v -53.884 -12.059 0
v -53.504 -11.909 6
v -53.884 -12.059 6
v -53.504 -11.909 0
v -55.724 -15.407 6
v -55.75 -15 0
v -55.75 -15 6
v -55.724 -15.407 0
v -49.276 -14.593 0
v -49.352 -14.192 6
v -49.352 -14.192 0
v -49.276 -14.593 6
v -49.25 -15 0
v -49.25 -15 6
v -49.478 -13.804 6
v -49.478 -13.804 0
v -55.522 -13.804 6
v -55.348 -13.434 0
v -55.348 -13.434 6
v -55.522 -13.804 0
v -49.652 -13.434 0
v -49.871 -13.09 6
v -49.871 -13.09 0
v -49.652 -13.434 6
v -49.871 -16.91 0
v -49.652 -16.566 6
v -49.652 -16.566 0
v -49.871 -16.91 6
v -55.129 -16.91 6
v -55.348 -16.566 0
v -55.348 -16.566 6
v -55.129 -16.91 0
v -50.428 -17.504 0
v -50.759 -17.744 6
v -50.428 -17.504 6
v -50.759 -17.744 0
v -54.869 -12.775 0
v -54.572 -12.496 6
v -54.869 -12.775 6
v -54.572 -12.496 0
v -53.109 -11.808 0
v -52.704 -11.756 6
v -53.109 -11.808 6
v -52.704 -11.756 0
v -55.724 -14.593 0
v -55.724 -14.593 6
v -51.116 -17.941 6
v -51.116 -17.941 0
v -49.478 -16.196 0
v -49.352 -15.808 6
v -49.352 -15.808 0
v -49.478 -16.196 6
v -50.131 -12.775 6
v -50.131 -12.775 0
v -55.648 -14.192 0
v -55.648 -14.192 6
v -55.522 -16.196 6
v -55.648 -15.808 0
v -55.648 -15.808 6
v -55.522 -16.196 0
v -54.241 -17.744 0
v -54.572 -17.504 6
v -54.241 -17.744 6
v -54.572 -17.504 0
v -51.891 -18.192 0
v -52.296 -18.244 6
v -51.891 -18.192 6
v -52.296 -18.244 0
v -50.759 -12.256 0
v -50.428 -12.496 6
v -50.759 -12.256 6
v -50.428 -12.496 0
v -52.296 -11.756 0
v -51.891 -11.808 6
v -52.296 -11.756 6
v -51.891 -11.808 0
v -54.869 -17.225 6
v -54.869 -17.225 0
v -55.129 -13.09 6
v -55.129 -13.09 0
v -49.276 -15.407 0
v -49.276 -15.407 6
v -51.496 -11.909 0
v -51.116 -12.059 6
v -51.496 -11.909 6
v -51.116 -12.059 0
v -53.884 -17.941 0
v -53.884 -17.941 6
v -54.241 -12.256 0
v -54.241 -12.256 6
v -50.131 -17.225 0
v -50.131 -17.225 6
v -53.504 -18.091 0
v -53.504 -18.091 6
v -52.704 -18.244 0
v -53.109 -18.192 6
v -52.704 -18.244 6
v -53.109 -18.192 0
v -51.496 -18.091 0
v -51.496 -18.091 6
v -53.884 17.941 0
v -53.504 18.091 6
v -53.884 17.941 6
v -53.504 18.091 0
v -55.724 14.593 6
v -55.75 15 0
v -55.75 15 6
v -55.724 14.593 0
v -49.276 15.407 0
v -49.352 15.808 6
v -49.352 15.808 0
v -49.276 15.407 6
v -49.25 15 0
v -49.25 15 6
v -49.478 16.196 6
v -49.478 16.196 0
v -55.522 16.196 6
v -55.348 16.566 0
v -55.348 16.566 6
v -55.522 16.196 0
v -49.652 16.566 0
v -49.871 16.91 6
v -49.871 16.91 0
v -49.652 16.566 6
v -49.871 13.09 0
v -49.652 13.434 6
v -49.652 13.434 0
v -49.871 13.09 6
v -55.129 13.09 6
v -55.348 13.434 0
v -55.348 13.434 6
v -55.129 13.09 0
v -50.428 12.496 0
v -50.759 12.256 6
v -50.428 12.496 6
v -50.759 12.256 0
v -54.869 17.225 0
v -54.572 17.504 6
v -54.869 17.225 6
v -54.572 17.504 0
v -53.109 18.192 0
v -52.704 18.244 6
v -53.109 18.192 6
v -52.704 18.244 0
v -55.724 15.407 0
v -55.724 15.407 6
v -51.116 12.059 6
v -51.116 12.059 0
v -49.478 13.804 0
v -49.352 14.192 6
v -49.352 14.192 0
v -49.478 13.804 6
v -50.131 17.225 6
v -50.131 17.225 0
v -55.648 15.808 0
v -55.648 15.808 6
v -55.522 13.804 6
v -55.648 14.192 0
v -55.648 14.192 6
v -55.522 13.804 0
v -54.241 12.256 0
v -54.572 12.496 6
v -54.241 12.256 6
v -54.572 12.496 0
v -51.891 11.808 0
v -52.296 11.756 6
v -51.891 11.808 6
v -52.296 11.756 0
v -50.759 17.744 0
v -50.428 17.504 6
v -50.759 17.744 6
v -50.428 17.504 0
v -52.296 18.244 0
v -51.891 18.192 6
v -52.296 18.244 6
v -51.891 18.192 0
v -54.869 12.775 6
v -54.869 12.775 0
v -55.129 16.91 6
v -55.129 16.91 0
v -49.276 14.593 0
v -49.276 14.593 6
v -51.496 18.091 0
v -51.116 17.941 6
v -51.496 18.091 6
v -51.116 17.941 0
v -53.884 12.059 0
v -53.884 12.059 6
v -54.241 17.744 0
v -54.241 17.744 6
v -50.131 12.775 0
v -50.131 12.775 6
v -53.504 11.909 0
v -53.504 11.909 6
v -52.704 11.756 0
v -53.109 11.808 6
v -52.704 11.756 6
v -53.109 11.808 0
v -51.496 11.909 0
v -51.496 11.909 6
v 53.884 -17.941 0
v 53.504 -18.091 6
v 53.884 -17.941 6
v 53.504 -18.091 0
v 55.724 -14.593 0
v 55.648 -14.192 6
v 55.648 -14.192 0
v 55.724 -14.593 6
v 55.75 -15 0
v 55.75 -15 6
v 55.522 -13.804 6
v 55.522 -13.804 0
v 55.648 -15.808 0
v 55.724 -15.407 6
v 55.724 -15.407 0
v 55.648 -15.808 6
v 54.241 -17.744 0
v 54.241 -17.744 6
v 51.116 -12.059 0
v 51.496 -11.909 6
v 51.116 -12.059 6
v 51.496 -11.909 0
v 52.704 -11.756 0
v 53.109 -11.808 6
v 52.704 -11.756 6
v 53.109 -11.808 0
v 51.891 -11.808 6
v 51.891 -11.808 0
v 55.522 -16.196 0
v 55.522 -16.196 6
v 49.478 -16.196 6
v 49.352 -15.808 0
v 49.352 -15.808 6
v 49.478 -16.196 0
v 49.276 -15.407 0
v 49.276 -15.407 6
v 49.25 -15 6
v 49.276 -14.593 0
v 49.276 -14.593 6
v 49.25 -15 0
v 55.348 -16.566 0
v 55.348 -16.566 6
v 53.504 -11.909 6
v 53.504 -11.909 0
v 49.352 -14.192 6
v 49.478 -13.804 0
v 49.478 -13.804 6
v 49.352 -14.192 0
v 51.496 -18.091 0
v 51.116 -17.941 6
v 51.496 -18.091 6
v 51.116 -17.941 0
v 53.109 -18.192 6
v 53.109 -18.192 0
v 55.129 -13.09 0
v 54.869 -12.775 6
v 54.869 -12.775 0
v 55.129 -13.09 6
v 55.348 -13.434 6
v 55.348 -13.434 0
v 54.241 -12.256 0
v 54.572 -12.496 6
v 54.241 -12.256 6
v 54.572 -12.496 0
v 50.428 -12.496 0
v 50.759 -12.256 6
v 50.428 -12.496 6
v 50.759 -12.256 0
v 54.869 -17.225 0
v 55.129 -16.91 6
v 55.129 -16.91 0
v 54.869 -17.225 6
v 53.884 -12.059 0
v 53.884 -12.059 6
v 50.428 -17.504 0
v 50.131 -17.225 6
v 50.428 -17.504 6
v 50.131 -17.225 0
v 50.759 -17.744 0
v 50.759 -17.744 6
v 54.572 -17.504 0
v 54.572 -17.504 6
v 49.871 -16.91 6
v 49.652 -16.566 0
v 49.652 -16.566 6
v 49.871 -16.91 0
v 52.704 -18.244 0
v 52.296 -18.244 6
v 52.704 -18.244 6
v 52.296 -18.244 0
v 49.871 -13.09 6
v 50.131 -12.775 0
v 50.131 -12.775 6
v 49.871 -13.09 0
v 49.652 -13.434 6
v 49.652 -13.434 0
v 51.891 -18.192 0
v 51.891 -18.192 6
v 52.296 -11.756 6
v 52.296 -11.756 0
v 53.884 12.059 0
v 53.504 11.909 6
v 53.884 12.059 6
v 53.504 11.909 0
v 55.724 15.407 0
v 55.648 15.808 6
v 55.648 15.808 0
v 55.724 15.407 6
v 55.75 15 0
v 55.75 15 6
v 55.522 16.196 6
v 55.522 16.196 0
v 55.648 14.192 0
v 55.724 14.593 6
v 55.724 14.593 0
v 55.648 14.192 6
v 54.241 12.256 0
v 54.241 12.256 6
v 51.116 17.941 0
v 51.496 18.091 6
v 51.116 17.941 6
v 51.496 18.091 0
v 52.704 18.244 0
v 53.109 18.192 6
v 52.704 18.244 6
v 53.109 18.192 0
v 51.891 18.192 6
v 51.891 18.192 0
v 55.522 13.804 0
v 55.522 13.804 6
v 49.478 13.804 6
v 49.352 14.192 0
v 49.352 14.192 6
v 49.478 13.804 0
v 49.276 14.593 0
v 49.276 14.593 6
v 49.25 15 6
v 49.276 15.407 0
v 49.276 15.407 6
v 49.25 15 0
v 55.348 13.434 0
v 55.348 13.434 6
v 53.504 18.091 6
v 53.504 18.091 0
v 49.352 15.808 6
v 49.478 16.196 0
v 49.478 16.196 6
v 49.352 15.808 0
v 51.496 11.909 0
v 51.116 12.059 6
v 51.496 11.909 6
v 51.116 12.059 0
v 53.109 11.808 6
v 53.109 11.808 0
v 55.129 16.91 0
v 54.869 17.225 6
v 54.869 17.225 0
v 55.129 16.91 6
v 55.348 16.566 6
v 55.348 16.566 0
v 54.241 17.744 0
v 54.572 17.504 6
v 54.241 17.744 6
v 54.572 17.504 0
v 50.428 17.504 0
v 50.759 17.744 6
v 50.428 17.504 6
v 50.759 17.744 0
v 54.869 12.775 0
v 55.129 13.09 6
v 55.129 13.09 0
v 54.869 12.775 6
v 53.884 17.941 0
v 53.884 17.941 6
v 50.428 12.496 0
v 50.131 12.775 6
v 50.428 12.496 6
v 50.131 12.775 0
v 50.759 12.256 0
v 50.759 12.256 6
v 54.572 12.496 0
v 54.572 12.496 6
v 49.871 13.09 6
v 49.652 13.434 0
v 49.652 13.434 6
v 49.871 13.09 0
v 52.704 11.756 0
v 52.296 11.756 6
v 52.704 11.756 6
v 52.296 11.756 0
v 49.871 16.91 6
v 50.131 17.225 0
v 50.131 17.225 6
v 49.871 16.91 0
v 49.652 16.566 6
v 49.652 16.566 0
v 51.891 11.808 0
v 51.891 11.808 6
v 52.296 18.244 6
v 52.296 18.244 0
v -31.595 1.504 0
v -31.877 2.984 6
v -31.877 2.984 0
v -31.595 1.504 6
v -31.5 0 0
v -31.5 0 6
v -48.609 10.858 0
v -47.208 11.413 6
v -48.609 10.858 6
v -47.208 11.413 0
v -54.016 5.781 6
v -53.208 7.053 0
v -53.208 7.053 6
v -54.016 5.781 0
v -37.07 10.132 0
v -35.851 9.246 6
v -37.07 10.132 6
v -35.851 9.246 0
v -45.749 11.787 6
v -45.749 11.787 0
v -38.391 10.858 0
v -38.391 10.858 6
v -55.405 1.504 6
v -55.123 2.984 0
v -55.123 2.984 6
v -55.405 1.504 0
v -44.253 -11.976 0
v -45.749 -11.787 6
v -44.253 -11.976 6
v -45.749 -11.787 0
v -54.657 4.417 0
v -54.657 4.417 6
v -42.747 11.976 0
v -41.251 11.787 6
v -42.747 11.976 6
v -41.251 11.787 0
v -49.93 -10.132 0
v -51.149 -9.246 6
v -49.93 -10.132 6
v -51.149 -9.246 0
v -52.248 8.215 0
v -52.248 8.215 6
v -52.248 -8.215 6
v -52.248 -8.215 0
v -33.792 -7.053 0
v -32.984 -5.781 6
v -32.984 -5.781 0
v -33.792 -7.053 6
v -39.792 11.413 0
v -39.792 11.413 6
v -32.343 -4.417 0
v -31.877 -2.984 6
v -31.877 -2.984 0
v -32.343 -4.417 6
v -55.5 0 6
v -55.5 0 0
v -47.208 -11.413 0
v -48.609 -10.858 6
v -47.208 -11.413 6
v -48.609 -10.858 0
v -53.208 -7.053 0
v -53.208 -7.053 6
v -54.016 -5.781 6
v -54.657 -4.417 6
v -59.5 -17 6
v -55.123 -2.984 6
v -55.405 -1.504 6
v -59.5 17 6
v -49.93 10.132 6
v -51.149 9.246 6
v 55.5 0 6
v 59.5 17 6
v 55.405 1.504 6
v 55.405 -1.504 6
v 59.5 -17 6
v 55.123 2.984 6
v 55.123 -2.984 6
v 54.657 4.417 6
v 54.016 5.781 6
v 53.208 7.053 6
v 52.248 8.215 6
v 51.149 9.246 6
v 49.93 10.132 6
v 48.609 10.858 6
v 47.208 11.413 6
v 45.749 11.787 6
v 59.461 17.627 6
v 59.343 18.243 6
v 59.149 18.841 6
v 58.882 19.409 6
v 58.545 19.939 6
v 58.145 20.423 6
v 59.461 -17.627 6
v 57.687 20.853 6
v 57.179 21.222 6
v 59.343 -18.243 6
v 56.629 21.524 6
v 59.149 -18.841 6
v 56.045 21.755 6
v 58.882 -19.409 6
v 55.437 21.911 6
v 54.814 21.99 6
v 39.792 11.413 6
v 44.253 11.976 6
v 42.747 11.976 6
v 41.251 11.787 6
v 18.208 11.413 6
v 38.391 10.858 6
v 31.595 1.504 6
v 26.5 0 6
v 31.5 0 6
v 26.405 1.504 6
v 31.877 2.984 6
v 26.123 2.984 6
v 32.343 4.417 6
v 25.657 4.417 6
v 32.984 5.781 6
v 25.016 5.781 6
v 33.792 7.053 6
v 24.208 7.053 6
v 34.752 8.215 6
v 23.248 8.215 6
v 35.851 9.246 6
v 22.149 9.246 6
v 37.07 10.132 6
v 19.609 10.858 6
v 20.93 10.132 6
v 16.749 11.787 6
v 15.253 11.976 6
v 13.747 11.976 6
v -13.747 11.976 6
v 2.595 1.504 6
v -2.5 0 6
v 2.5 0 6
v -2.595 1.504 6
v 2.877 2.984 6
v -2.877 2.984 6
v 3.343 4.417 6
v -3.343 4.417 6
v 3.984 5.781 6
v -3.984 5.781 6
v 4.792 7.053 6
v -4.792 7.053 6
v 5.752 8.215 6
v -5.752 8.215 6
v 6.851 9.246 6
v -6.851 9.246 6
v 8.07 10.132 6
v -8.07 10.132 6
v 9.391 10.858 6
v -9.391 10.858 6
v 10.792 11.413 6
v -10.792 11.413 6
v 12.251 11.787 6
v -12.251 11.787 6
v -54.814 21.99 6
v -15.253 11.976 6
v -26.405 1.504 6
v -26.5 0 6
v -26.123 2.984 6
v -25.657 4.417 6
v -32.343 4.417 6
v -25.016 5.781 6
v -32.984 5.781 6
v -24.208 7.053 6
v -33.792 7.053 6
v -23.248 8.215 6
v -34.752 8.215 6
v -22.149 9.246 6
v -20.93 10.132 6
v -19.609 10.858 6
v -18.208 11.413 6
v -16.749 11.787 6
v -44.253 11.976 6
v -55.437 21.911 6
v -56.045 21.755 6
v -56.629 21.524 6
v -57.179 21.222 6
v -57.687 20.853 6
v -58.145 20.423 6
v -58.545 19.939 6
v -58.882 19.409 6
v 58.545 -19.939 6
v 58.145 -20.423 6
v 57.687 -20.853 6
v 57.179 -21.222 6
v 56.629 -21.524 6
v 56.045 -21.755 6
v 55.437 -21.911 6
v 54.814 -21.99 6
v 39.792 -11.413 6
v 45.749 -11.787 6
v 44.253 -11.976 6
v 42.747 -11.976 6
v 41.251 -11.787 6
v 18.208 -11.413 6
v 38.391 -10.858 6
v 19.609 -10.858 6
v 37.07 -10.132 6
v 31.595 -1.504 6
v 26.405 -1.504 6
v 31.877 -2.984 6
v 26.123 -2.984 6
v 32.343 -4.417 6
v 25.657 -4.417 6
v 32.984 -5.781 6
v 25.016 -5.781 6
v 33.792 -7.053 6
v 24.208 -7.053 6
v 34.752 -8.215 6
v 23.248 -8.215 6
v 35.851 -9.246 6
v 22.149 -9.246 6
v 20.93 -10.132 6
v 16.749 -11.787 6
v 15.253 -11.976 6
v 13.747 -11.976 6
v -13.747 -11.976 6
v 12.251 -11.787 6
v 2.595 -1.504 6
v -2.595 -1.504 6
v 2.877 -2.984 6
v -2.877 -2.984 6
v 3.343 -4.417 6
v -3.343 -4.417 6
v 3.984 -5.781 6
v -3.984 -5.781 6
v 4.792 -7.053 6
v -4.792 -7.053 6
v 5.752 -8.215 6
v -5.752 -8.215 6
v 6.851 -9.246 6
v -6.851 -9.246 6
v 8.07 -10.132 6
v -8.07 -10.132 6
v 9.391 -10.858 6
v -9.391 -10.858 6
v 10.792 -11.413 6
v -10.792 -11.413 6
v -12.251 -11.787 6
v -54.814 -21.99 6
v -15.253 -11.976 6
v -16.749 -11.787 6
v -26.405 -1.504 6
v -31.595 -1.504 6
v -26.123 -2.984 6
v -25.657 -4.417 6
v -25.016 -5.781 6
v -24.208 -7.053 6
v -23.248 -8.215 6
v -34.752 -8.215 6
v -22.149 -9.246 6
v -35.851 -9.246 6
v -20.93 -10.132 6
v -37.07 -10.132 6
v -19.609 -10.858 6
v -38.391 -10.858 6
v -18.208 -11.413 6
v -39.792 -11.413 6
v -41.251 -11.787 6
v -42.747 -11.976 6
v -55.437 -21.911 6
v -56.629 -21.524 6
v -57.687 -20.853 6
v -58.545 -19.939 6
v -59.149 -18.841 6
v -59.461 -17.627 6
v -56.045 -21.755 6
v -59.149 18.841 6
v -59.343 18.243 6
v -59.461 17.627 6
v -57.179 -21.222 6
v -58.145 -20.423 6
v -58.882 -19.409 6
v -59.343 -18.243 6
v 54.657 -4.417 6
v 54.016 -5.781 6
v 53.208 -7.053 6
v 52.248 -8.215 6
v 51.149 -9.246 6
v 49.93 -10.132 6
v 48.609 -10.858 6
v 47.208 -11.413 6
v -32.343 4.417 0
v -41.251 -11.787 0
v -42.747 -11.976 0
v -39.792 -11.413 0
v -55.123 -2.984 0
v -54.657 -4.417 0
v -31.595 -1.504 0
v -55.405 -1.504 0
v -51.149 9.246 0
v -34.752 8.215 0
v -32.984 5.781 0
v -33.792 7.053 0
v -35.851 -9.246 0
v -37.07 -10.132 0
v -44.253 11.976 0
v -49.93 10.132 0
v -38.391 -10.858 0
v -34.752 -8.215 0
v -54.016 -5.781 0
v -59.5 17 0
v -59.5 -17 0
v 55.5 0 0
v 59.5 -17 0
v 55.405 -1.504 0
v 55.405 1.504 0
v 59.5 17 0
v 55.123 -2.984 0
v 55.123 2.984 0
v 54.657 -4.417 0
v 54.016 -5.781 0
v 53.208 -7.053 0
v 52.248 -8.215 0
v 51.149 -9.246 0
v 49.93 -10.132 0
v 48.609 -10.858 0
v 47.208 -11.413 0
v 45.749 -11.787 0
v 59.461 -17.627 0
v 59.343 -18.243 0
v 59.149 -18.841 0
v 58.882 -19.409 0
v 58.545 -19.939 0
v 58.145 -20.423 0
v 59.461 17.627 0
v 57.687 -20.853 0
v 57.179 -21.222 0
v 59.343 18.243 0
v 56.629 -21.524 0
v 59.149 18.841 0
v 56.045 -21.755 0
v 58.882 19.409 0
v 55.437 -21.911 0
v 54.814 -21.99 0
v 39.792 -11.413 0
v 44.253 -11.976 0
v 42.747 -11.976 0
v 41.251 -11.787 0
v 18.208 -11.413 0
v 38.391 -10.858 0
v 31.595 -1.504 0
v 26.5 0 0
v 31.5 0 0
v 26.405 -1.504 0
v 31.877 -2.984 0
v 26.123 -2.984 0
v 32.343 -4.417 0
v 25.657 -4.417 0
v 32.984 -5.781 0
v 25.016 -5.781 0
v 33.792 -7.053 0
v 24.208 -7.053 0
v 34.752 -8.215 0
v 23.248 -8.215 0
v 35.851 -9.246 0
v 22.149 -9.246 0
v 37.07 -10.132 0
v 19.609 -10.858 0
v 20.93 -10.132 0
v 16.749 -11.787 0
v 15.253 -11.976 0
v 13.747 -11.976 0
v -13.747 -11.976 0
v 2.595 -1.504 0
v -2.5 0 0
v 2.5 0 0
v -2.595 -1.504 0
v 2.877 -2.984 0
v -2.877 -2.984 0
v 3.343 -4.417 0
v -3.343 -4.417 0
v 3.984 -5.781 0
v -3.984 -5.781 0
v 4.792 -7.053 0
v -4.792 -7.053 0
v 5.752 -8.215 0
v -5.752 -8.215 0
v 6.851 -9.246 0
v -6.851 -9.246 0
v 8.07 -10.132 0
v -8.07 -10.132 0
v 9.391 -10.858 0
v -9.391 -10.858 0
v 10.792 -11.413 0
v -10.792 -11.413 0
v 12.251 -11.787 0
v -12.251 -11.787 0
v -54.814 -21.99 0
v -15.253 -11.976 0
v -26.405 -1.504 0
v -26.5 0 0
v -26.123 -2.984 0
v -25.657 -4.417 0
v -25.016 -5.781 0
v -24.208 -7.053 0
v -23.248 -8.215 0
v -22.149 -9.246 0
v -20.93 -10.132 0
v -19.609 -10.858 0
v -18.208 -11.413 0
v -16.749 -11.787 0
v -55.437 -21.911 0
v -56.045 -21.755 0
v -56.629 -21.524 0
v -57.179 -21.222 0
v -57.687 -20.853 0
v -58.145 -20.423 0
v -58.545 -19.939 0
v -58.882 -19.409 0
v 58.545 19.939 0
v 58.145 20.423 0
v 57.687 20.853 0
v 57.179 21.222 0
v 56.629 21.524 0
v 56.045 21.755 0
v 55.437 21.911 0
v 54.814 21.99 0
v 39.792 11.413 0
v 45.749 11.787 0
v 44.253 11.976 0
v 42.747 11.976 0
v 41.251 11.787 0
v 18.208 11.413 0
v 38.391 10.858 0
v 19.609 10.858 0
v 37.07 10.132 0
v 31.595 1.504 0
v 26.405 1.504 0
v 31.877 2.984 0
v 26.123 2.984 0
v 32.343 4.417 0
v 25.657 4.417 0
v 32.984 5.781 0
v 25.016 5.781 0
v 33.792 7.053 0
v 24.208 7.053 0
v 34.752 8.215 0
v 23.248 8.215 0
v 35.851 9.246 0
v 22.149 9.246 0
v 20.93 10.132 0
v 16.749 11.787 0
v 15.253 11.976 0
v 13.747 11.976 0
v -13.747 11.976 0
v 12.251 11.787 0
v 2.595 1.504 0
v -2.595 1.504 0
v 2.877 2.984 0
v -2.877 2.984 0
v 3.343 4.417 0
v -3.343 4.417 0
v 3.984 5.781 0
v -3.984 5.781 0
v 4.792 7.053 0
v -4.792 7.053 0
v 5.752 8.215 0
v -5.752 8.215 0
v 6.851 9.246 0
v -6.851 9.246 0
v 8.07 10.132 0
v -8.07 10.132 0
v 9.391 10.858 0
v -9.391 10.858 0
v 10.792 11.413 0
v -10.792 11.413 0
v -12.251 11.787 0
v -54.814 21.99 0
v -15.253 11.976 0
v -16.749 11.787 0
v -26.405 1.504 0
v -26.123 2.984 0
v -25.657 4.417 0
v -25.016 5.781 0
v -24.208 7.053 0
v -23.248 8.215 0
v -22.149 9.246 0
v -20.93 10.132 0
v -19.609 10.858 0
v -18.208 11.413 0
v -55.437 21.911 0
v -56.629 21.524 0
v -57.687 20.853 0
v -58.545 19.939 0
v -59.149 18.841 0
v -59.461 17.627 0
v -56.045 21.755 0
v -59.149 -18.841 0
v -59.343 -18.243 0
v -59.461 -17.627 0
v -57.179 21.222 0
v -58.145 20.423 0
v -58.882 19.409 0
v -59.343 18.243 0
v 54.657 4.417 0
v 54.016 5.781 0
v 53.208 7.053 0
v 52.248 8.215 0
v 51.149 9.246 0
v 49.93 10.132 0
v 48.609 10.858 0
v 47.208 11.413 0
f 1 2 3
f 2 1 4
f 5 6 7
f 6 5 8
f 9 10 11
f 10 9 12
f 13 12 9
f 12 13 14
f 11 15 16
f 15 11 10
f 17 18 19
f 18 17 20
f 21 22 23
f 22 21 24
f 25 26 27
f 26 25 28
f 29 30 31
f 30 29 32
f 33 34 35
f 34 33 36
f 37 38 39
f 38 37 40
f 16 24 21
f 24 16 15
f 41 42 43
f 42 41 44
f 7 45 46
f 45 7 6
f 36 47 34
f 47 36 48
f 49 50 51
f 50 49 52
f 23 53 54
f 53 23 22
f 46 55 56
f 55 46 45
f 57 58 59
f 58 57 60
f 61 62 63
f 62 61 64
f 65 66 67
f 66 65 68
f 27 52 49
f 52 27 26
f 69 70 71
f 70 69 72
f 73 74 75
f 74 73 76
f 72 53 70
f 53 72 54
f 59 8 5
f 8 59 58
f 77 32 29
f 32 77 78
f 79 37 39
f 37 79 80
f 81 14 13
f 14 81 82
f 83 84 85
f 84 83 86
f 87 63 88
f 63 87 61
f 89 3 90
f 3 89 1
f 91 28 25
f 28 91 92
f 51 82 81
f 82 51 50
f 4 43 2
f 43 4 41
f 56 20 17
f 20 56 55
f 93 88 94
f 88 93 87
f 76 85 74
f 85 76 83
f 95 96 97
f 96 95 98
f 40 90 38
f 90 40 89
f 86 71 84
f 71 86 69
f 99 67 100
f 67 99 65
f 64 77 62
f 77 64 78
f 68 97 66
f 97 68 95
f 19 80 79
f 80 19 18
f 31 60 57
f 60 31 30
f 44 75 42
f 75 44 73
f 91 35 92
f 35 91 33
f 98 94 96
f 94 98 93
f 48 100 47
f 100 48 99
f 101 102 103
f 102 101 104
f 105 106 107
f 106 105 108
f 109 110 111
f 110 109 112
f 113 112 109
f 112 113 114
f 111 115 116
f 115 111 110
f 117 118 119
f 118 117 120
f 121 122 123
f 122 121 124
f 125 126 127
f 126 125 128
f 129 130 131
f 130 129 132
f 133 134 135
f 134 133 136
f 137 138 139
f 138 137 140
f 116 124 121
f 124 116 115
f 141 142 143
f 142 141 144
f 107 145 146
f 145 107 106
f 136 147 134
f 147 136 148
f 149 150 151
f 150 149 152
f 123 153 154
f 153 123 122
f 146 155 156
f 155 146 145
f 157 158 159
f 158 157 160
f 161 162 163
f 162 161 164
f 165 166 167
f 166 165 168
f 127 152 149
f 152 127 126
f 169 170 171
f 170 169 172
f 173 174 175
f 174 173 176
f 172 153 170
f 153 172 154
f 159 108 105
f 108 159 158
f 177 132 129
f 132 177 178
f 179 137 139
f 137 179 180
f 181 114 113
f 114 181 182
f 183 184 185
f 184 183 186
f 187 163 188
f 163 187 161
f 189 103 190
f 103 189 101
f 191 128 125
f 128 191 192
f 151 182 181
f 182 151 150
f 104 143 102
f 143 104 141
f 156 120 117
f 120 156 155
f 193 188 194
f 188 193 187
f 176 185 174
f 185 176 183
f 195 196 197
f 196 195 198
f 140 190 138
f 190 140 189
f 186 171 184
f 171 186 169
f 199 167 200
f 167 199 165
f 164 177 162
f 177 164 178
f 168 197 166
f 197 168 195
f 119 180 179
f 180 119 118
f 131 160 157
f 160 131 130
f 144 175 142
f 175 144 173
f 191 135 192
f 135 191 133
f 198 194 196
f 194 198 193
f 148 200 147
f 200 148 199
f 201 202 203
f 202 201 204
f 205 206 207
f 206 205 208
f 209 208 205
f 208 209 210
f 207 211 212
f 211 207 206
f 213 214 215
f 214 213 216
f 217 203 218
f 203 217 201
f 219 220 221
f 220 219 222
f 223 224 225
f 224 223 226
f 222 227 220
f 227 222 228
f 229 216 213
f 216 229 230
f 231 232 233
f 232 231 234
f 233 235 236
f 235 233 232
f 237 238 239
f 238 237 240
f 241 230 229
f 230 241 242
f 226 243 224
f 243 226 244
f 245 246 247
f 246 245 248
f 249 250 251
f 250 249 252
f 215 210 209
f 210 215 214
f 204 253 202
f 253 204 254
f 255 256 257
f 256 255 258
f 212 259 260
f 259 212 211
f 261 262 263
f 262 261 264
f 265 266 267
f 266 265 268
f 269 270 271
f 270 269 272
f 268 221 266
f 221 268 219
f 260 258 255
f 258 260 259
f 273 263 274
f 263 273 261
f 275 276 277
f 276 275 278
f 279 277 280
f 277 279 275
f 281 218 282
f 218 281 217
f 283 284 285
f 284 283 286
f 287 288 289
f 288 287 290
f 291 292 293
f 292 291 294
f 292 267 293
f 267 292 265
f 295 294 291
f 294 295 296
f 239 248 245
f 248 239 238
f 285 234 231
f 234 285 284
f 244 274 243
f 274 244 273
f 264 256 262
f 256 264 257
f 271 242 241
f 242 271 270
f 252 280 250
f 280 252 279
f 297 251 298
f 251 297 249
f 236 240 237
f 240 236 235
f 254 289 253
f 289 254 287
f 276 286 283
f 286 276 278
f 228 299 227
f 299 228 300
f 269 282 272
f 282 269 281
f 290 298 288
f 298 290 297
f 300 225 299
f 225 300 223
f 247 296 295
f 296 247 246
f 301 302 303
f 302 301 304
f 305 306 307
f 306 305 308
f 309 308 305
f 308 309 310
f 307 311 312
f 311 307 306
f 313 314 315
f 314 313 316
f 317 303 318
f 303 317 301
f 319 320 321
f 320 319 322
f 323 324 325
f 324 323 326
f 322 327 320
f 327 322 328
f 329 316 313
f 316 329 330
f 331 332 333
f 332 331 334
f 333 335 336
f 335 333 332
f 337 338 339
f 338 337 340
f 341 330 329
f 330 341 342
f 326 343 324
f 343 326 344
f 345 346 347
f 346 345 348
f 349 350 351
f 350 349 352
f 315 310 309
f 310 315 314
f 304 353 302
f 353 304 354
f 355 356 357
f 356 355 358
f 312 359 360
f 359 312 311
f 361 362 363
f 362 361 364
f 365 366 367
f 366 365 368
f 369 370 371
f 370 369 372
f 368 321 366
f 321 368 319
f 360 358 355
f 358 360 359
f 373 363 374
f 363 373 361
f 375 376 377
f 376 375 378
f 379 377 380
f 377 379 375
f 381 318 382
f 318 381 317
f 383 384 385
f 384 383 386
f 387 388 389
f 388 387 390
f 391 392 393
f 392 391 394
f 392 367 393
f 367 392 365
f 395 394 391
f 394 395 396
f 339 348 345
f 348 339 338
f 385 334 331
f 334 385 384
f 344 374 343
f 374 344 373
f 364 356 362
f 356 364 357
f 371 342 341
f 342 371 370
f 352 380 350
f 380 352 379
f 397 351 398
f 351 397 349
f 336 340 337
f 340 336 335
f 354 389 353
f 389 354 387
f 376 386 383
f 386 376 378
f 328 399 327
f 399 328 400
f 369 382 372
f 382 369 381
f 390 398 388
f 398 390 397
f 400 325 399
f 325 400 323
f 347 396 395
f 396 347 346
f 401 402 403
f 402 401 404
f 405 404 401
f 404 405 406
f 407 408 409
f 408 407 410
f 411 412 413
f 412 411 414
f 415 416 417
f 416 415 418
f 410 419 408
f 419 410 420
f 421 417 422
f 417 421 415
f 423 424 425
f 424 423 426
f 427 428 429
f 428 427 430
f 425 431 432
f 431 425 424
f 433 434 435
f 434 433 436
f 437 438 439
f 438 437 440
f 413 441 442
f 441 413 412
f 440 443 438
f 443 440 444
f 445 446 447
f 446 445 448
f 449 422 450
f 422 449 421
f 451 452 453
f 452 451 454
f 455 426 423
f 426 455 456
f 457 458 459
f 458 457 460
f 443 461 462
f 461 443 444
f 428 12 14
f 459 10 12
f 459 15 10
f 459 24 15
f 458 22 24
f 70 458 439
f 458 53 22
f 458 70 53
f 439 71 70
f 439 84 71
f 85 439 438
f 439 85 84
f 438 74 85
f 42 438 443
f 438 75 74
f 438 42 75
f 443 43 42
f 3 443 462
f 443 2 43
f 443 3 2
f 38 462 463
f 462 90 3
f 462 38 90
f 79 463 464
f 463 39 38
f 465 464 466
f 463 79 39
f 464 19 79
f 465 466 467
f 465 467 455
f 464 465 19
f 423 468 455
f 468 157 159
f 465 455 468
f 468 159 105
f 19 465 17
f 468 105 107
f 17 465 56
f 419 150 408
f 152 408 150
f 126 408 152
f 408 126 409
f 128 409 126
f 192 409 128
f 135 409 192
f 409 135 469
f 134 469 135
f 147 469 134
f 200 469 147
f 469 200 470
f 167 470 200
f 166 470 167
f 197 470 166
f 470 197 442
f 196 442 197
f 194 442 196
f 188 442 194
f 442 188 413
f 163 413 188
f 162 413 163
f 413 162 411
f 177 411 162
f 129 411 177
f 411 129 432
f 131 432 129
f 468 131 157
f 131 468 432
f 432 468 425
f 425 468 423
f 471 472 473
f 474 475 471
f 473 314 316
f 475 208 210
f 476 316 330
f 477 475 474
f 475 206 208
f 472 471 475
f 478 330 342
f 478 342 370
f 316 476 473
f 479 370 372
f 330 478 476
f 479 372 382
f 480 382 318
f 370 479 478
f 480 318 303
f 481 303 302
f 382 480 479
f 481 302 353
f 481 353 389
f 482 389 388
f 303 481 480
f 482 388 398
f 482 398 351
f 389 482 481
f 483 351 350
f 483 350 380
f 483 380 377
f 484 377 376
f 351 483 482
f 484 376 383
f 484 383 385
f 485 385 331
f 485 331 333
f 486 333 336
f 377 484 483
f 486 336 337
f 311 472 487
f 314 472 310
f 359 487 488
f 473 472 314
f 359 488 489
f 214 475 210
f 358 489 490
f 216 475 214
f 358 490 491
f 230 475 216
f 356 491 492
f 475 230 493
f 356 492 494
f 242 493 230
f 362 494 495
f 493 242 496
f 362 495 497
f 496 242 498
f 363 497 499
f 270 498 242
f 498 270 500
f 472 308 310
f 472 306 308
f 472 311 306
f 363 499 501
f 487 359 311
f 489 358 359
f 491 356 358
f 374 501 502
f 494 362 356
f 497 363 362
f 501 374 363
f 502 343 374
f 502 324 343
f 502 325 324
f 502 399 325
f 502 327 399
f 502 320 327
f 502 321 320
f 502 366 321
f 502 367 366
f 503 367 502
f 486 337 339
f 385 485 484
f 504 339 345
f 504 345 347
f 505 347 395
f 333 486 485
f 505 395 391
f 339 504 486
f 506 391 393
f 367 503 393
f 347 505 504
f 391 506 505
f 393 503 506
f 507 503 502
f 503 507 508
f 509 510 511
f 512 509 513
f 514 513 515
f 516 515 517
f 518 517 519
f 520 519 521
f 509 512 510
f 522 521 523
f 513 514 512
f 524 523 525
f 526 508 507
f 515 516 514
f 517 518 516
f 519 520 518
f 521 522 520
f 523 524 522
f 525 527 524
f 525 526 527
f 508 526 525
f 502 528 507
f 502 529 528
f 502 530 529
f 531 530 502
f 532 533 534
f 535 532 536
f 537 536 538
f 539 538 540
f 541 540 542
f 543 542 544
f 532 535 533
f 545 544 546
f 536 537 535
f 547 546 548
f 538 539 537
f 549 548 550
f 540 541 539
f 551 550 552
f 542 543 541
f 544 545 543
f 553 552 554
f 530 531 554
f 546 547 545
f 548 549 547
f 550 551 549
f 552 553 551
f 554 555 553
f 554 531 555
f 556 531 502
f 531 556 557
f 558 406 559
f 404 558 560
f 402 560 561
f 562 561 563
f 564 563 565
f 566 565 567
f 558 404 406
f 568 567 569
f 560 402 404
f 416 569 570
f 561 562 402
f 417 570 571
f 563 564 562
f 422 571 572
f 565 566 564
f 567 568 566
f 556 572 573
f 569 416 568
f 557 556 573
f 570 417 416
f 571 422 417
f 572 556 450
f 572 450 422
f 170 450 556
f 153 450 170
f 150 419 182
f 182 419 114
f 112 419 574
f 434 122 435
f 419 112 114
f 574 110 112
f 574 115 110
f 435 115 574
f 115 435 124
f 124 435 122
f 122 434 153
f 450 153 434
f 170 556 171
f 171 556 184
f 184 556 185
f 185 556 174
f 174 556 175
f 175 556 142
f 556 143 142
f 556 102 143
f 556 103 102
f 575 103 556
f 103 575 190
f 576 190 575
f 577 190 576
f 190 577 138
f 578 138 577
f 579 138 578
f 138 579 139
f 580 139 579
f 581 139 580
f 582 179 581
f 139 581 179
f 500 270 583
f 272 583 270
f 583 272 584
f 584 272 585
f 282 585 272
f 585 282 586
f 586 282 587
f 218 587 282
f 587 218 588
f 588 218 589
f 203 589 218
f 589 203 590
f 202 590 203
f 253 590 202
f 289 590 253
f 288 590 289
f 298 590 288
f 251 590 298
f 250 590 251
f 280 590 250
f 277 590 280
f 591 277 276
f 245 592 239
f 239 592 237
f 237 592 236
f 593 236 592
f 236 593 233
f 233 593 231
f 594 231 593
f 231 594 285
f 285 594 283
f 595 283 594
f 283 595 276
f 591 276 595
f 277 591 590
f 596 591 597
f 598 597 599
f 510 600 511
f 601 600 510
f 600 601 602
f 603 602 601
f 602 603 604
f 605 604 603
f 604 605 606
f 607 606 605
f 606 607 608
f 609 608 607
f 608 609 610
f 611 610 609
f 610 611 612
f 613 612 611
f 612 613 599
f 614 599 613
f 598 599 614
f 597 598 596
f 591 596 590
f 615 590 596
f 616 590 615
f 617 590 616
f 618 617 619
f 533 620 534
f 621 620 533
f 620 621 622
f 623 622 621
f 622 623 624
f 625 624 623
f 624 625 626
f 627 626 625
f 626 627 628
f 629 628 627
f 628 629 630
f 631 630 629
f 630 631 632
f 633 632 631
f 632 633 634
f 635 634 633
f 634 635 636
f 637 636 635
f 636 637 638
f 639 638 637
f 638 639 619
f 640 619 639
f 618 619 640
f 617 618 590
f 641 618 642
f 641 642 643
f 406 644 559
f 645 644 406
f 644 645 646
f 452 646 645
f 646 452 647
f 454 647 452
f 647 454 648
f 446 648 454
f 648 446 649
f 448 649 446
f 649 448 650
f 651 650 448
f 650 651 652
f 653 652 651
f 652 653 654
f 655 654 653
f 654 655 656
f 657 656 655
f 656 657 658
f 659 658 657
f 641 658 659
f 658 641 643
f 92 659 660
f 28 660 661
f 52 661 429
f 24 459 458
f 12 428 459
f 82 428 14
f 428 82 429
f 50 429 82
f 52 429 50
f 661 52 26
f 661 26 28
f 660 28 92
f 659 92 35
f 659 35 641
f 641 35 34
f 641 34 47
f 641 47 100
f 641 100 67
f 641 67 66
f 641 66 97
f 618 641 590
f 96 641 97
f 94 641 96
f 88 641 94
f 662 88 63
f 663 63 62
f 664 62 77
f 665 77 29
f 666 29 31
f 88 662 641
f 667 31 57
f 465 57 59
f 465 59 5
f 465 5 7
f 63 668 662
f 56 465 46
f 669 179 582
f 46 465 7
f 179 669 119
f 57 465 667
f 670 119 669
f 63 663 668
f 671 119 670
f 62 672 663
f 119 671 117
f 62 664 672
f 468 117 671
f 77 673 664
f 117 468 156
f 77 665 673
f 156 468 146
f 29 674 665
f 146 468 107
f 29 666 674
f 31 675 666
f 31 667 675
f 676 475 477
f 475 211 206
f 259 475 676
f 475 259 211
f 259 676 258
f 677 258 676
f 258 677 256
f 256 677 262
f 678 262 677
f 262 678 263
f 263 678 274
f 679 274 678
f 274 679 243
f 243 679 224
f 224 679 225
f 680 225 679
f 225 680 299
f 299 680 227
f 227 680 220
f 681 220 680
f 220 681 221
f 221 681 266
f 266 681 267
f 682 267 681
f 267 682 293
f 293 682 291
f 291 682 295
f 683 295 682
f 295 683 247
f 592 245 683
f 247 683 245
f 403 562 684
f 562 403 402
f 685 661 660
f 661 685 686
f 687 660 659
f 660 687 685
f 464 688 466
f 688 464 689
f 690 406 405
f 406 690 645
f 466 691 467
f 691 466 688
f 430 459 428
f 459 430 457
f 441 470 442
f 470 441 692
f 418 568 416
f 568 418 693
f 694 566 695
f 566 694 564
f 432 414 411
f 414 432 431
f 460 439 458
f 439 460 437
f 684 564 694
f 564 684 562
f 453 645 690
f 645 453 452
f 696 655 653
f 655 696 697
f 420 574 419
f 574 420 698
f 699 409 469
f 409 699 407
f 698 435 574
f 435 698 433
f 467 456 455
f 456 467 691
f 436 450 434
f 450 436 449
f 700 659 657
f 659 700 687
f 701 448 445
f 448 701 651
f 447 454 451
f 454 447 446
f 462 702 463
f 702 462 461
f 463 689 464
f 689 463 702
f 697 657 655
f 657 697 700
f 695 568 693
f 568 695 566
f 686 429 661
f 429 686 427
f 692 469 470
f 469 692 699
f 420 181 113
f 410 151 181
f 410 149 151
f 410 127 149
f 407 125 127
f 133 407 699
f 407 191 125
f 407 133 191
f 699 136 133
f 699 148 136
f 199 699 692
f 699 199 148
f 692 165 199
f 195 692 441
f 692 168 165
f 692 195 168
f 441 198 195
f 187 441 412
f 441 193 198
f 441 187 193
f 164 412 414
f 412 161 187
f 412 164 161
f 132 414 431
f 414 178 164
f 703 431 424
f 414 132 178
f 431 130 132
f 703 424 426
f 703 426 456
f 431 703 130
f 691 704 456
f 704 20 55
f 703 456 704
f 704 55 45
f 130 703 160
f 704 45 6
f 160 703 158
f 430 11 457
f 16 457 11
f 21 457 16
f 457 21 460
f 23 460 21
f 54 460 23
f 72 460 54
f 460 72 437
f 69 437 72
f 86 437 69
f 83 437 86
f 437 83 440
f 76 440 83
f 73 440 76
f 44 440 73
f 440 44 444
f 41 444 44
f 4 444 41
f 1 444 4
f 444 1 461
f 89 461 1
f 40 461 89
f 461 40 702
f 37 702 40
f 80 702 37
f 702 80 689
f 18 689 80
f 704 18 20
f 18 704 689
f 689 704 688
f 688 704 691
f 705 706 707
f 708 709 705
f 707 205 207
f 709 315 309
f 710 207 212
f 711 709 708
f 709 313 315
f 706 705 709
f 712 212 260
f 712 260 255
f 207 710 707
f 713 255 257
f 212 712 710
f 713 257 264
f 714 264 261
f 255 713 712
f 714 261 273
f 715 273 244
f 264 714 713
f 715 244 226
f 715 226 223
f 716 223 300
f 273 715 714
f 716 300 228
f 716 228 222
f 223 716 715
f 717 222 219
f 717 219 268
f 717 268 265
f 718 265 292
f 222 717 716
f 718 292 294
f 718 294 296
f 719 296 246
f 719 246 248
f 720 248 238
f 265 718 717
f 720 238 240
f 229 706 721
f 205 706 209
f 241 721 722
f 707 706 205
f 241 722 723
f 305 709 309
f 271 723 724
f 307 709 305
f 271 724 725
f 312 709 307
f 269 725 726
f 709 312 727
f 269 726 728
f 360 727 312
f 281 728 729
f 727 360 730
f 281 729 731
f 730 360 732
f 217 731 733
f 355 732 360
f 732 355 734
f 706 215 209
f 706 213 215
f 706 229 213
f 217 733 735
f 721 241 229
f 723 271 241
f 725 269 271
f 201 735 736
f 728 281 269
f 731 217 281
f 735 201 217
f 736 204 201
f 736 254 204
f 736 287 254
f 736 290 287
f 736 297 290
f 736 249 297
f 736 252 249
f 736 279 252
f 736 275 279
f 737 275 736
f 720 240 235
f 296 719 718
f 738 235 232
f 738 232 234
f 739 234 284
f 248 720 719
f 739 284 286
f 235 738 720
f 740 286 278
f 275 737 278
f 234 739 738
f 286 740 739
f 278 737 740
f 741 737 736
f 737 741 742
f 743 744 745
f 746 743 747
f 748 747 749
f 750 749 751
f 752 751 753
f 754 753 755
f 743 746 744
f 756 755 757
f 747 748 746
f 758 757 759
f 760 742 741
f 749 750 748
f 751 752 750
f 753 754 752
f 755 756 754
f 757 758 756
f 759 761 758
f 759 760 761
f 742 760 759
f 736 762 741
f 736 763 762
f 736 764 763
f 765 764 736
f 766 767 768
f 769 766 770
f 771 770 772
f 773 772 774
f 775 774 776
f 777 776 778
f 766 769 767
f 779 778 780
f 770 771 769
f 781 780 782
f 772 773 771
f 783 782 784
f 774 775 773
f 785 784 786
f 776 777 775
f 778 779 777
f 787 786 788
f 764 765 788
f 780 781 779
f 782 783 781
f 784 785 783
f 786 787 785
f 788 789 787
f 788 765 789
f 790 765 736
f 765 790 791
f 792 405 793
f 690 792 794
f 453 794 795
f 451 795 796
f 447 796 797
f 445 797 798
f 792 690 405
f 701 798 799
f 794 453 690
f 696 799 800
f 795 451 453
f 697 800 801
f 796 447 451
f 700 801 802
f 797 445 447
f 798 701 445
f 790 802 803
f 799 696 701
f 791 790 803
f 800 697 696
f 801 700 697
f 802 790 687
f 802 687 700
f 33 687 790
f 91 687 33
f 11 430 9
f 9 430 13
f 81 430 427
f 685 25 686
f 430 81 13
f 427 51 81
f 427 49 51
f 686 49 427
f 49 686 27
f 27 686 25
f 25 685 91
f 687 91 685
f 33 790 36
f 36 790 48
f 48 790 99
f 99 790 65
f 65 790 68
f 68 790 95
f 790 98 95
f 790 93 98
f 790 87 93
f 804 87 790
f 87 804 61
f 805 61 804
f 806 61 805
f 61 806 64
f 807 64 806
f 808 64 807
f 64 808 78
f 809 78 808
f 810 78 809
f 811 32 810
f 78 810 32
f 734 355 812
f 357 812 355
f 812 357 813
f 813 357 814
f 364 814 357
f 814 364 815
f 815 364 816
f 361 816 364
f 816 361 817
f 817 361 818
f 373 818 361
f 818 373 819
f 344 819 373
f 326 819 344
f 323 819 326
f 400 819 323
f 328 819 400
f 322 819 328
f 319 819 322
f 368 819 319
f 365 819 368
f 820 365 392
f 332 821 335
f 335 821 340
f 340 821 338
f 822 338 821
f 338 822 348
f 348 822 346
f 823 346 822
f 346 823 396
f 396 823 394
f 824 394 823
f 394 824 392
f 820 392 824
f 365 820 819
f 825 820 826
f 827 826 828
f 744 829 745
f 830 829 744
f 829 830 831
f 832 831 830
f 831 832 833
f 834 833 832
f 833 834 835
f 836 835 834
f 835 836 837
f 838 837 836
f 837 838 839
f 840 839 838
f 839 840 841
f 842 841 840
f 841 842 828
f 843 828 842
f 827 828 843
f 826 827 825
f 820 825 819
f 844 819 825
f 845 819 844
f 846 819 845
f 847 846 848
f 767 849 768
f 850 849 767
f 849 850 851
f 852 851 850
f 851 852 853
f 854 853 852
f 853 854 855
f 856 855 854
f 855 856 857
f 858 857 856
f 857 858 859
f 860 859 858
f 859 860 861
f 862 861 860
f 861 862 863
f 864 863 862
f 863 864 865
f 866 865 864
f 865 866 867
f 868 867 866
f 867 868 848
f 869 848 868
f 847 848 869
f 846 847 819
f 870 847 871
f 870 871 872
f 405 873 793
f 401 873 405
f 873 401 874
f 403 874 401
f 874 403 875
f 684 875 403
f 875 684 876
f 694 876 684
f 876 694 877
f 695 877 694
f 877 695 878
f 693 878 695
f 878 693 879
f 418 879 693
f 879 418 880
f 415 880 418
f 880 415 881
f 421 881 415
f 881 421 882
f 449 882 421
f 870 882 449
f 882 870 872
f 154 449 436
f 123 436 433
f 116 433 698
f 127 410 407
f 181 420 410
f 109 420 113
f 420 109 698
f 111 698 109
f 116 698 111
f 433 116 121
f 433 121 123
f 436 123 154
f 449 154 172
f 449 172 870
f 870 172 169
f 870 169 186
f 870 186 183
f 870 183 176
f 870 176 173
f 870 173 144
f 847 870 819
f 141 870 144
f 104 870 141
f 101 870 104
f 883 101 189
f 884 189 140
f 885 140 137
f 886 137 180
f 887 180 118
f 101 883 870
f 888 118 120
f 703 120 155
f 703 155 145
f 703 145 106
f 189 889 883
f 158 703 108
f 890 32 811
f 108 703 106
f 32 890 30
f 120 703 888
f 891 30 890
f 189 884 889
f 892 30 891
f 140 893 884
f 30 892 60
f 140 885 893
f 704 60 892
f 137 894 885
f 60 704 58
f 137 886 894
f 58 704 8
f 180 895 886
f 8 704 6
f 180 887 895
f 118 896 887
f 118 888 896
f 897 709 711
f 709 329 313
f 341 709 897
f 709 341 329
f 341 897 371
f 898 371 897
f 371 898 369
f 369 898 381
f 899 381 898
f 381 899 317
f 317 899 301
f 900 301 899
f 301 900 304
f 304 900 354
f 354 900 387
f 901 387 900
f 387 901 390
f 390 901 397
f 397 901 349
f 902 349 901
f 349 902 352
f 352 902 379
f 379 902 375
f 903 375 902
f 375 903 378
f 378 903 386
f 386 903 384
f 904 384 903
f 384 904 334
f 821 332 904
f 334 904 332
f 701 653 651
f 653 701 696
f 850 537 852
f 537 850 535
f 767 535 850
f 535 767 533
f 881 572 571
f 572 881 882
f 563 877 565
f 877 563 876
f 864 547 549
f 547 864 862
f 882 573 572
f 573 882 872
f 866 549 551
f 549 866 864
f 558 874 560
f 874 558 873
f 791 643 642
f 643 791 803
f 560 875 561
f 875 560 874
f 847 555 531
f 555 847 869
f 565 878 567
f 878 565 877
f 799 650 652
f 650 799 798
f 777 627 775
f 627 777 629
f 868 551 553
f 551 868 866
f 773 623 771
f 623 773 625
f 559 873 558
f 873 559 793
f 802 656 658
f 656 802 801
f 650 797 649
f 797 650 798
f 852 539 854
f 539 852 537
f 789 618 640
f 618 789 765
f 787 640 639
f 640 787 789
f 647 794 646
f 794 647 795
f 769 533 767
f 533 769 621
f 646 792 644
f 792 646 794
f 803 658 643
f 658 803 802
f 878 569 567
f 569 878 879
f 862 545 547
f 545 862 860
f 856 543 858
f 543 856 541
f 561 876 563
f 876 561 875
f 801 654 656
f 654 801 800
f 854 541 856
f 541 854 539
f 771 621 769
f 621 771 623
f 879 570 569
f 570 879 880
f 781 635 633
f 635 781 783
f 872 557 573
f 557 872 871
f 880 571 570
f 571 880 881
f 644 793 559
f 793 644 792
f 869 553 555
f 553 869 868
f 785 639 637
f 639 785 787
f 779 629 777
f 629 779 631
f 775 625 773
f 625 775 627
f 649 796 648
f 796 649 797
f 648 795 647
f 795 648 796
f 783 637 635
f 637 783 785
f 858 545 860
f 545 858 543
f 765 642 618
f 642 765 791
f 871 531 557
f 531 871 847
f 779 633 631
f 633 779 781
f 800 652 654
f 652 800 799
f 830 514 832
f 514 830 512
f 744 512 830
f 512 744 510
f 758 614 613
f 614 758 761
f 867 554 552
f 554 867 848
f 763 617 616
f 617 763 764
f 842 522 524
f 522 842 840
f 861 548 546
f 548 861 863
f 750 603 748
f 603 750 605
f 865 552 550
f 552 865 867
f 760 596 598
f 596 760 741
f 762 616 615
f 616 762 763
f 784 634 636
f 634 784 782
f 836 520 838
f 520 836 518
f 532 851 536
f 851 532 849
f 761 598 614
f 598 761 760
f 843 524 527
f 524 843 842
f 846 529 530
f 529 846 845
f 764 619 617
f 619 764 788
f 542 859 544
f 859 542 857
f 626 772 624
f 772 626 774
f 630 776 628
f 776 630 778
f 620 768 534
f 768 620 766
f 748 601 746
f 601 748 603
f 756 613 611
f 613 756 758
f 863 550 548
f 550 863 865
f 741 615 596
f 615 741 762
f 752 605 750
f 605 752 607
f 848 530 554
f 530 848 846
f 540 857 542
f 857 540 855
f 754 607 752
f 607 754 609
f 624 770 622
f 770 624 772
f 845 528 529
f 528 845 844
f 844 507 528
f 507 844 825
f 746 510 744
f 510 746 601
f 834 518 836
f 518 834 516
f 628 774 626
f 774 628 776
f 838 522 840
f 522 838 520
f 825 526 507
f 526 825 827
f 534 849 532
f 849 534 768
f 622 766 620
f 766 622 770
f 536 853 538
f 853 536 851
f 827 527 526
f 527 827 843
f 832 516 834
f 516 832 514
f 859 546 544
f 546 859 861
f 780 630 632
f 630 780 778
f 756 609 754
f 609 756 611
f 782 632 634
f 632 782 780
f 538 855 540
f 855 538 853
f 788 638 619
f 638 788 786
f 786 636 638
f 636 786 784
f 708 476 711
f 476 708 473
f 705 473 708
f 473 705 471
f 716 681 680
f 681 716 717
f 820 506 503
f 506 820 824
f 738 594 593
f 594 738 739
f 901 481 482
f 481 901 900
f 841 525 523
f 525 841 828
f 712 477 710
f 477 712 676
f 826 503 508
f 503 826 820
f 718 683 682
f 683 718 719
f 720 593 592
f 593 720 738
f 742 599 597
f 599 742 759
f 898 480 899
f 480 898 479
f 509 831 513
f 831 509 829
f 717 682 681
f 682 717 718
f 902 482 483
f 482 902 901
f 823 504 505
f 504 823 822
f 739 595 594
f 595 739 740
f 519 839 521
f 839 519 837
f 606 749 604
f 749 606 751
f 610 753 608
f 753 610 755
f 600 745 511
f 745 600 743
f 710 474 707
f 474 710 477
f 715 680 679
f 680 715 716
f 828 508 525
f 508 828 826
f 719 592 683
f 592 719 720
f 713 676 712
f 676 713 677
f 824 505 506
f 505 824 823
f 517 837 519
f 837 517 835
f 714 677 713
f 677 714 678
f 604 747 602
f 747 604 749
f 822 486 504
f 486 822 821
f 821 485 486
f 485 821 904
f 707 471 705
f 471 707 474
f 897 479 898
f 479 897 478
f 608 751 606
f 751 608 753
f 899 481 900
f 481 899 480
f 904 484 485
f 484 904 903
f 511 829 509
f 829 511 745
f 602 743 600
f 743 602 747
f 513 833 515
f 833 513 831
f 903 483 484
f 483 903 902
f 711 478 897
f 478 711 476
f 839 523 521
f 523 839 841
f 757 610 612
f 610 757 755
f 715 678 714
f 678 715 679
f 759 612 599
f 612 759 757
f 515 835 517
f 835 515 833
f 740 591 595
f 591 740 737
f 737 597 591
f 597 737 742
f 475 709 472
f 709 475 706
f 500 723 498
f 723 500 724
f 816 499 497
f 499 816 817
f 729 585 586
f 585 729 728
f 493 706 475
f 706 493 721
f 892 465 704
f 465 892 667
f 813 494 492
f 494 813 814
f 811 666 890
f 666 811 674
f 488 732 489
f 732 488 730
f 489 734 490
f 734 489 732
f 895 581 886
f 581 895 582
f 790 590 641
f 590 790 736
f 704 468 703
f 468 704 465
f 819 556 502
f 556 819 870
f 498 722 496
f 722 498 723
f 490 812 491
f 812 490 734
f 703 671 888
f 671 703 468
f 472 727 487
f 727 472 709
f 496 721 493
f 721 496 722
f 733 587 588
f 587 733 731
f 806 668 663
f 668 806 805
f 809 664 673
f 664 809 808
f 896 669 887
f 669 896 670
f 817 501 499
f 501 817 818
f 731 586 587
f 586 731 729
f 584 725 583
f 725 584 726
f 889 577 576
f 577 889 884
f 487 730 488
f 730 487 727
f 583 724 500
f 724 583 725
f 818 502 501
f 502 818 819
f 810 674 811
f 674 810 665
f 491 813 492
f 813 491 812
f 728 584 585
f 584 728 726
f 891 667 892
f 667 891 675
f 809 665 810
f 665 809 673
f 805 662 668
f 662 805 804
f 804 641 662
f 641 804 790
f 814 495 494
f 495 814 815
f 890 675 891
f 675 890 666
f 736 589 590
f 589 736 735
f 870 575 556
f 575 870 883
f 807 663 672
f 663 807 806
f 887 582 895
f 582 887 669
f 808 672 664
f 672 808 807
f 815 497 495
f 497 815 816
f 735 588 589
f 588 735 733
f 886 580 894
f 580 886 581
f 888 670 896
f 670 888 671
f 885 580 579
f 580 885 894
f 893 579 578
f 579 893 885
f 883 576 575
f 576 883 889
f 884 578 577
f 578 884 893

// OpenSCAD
$fn = 50;


difference() {
	union() {
		hull() {
			translate(v = [-54.5000000000, 17.0000000000, 0]) {
				cylinder(h = 6, r = 5);
			}
			translate(v = [54.5000000000, 17.0000000000, 0]) {
				cylinder(h = 6, r = 5);
			}
			translate(v = [-54.5000000000, -17.0000000000, 0]) {
				cylinder(h = 6, r = 5);
			}
			translate(v = [54.5000000000, -17.0000000000, 0]) {
				cylinder(h = 6, r = 5);
			}
		}
	}
	union() {
		#translate(v = [-52.5000000000, -15.0000000000, -100.0000000000]) {
			cylinder(h = 200, r = 3.2500000000);
		}
		#translate(v = [-52.5000000000, 15.0000000000, -100.0000000000]) {
			cylinder(h = 200, r = 3.2500000000);
		}
		#translate(v = [52.5000000000, -15.0000000000, -100.0000000000]) {
			cylinder(h = 200, r = 3.2500000000);
		}
		#translate(v = [52.5000000000, 15.0000000000, -100.0000000000]) {
			cylinder(h = 200, r = 3.2500000000);
		}
		#translate(v = [-43.5000000000, 0, 0]) {
			cylinder(h = 6, r = 12.0000000000);
		}
		#translate(v = [-14.5000000000, 0, 0]) {
			cylinder(h = 6, r = 12.0000000000);
		}
		#translate(v = [14.5000000000, 0, 0]) {
			cylinder(h = 6, r = 12.0000000000);
		}
		#translate(v = [43.5000000000, 0, 0]) {
			cylinder(h = 6, r = 12.0000000000);
		}
	}
}
